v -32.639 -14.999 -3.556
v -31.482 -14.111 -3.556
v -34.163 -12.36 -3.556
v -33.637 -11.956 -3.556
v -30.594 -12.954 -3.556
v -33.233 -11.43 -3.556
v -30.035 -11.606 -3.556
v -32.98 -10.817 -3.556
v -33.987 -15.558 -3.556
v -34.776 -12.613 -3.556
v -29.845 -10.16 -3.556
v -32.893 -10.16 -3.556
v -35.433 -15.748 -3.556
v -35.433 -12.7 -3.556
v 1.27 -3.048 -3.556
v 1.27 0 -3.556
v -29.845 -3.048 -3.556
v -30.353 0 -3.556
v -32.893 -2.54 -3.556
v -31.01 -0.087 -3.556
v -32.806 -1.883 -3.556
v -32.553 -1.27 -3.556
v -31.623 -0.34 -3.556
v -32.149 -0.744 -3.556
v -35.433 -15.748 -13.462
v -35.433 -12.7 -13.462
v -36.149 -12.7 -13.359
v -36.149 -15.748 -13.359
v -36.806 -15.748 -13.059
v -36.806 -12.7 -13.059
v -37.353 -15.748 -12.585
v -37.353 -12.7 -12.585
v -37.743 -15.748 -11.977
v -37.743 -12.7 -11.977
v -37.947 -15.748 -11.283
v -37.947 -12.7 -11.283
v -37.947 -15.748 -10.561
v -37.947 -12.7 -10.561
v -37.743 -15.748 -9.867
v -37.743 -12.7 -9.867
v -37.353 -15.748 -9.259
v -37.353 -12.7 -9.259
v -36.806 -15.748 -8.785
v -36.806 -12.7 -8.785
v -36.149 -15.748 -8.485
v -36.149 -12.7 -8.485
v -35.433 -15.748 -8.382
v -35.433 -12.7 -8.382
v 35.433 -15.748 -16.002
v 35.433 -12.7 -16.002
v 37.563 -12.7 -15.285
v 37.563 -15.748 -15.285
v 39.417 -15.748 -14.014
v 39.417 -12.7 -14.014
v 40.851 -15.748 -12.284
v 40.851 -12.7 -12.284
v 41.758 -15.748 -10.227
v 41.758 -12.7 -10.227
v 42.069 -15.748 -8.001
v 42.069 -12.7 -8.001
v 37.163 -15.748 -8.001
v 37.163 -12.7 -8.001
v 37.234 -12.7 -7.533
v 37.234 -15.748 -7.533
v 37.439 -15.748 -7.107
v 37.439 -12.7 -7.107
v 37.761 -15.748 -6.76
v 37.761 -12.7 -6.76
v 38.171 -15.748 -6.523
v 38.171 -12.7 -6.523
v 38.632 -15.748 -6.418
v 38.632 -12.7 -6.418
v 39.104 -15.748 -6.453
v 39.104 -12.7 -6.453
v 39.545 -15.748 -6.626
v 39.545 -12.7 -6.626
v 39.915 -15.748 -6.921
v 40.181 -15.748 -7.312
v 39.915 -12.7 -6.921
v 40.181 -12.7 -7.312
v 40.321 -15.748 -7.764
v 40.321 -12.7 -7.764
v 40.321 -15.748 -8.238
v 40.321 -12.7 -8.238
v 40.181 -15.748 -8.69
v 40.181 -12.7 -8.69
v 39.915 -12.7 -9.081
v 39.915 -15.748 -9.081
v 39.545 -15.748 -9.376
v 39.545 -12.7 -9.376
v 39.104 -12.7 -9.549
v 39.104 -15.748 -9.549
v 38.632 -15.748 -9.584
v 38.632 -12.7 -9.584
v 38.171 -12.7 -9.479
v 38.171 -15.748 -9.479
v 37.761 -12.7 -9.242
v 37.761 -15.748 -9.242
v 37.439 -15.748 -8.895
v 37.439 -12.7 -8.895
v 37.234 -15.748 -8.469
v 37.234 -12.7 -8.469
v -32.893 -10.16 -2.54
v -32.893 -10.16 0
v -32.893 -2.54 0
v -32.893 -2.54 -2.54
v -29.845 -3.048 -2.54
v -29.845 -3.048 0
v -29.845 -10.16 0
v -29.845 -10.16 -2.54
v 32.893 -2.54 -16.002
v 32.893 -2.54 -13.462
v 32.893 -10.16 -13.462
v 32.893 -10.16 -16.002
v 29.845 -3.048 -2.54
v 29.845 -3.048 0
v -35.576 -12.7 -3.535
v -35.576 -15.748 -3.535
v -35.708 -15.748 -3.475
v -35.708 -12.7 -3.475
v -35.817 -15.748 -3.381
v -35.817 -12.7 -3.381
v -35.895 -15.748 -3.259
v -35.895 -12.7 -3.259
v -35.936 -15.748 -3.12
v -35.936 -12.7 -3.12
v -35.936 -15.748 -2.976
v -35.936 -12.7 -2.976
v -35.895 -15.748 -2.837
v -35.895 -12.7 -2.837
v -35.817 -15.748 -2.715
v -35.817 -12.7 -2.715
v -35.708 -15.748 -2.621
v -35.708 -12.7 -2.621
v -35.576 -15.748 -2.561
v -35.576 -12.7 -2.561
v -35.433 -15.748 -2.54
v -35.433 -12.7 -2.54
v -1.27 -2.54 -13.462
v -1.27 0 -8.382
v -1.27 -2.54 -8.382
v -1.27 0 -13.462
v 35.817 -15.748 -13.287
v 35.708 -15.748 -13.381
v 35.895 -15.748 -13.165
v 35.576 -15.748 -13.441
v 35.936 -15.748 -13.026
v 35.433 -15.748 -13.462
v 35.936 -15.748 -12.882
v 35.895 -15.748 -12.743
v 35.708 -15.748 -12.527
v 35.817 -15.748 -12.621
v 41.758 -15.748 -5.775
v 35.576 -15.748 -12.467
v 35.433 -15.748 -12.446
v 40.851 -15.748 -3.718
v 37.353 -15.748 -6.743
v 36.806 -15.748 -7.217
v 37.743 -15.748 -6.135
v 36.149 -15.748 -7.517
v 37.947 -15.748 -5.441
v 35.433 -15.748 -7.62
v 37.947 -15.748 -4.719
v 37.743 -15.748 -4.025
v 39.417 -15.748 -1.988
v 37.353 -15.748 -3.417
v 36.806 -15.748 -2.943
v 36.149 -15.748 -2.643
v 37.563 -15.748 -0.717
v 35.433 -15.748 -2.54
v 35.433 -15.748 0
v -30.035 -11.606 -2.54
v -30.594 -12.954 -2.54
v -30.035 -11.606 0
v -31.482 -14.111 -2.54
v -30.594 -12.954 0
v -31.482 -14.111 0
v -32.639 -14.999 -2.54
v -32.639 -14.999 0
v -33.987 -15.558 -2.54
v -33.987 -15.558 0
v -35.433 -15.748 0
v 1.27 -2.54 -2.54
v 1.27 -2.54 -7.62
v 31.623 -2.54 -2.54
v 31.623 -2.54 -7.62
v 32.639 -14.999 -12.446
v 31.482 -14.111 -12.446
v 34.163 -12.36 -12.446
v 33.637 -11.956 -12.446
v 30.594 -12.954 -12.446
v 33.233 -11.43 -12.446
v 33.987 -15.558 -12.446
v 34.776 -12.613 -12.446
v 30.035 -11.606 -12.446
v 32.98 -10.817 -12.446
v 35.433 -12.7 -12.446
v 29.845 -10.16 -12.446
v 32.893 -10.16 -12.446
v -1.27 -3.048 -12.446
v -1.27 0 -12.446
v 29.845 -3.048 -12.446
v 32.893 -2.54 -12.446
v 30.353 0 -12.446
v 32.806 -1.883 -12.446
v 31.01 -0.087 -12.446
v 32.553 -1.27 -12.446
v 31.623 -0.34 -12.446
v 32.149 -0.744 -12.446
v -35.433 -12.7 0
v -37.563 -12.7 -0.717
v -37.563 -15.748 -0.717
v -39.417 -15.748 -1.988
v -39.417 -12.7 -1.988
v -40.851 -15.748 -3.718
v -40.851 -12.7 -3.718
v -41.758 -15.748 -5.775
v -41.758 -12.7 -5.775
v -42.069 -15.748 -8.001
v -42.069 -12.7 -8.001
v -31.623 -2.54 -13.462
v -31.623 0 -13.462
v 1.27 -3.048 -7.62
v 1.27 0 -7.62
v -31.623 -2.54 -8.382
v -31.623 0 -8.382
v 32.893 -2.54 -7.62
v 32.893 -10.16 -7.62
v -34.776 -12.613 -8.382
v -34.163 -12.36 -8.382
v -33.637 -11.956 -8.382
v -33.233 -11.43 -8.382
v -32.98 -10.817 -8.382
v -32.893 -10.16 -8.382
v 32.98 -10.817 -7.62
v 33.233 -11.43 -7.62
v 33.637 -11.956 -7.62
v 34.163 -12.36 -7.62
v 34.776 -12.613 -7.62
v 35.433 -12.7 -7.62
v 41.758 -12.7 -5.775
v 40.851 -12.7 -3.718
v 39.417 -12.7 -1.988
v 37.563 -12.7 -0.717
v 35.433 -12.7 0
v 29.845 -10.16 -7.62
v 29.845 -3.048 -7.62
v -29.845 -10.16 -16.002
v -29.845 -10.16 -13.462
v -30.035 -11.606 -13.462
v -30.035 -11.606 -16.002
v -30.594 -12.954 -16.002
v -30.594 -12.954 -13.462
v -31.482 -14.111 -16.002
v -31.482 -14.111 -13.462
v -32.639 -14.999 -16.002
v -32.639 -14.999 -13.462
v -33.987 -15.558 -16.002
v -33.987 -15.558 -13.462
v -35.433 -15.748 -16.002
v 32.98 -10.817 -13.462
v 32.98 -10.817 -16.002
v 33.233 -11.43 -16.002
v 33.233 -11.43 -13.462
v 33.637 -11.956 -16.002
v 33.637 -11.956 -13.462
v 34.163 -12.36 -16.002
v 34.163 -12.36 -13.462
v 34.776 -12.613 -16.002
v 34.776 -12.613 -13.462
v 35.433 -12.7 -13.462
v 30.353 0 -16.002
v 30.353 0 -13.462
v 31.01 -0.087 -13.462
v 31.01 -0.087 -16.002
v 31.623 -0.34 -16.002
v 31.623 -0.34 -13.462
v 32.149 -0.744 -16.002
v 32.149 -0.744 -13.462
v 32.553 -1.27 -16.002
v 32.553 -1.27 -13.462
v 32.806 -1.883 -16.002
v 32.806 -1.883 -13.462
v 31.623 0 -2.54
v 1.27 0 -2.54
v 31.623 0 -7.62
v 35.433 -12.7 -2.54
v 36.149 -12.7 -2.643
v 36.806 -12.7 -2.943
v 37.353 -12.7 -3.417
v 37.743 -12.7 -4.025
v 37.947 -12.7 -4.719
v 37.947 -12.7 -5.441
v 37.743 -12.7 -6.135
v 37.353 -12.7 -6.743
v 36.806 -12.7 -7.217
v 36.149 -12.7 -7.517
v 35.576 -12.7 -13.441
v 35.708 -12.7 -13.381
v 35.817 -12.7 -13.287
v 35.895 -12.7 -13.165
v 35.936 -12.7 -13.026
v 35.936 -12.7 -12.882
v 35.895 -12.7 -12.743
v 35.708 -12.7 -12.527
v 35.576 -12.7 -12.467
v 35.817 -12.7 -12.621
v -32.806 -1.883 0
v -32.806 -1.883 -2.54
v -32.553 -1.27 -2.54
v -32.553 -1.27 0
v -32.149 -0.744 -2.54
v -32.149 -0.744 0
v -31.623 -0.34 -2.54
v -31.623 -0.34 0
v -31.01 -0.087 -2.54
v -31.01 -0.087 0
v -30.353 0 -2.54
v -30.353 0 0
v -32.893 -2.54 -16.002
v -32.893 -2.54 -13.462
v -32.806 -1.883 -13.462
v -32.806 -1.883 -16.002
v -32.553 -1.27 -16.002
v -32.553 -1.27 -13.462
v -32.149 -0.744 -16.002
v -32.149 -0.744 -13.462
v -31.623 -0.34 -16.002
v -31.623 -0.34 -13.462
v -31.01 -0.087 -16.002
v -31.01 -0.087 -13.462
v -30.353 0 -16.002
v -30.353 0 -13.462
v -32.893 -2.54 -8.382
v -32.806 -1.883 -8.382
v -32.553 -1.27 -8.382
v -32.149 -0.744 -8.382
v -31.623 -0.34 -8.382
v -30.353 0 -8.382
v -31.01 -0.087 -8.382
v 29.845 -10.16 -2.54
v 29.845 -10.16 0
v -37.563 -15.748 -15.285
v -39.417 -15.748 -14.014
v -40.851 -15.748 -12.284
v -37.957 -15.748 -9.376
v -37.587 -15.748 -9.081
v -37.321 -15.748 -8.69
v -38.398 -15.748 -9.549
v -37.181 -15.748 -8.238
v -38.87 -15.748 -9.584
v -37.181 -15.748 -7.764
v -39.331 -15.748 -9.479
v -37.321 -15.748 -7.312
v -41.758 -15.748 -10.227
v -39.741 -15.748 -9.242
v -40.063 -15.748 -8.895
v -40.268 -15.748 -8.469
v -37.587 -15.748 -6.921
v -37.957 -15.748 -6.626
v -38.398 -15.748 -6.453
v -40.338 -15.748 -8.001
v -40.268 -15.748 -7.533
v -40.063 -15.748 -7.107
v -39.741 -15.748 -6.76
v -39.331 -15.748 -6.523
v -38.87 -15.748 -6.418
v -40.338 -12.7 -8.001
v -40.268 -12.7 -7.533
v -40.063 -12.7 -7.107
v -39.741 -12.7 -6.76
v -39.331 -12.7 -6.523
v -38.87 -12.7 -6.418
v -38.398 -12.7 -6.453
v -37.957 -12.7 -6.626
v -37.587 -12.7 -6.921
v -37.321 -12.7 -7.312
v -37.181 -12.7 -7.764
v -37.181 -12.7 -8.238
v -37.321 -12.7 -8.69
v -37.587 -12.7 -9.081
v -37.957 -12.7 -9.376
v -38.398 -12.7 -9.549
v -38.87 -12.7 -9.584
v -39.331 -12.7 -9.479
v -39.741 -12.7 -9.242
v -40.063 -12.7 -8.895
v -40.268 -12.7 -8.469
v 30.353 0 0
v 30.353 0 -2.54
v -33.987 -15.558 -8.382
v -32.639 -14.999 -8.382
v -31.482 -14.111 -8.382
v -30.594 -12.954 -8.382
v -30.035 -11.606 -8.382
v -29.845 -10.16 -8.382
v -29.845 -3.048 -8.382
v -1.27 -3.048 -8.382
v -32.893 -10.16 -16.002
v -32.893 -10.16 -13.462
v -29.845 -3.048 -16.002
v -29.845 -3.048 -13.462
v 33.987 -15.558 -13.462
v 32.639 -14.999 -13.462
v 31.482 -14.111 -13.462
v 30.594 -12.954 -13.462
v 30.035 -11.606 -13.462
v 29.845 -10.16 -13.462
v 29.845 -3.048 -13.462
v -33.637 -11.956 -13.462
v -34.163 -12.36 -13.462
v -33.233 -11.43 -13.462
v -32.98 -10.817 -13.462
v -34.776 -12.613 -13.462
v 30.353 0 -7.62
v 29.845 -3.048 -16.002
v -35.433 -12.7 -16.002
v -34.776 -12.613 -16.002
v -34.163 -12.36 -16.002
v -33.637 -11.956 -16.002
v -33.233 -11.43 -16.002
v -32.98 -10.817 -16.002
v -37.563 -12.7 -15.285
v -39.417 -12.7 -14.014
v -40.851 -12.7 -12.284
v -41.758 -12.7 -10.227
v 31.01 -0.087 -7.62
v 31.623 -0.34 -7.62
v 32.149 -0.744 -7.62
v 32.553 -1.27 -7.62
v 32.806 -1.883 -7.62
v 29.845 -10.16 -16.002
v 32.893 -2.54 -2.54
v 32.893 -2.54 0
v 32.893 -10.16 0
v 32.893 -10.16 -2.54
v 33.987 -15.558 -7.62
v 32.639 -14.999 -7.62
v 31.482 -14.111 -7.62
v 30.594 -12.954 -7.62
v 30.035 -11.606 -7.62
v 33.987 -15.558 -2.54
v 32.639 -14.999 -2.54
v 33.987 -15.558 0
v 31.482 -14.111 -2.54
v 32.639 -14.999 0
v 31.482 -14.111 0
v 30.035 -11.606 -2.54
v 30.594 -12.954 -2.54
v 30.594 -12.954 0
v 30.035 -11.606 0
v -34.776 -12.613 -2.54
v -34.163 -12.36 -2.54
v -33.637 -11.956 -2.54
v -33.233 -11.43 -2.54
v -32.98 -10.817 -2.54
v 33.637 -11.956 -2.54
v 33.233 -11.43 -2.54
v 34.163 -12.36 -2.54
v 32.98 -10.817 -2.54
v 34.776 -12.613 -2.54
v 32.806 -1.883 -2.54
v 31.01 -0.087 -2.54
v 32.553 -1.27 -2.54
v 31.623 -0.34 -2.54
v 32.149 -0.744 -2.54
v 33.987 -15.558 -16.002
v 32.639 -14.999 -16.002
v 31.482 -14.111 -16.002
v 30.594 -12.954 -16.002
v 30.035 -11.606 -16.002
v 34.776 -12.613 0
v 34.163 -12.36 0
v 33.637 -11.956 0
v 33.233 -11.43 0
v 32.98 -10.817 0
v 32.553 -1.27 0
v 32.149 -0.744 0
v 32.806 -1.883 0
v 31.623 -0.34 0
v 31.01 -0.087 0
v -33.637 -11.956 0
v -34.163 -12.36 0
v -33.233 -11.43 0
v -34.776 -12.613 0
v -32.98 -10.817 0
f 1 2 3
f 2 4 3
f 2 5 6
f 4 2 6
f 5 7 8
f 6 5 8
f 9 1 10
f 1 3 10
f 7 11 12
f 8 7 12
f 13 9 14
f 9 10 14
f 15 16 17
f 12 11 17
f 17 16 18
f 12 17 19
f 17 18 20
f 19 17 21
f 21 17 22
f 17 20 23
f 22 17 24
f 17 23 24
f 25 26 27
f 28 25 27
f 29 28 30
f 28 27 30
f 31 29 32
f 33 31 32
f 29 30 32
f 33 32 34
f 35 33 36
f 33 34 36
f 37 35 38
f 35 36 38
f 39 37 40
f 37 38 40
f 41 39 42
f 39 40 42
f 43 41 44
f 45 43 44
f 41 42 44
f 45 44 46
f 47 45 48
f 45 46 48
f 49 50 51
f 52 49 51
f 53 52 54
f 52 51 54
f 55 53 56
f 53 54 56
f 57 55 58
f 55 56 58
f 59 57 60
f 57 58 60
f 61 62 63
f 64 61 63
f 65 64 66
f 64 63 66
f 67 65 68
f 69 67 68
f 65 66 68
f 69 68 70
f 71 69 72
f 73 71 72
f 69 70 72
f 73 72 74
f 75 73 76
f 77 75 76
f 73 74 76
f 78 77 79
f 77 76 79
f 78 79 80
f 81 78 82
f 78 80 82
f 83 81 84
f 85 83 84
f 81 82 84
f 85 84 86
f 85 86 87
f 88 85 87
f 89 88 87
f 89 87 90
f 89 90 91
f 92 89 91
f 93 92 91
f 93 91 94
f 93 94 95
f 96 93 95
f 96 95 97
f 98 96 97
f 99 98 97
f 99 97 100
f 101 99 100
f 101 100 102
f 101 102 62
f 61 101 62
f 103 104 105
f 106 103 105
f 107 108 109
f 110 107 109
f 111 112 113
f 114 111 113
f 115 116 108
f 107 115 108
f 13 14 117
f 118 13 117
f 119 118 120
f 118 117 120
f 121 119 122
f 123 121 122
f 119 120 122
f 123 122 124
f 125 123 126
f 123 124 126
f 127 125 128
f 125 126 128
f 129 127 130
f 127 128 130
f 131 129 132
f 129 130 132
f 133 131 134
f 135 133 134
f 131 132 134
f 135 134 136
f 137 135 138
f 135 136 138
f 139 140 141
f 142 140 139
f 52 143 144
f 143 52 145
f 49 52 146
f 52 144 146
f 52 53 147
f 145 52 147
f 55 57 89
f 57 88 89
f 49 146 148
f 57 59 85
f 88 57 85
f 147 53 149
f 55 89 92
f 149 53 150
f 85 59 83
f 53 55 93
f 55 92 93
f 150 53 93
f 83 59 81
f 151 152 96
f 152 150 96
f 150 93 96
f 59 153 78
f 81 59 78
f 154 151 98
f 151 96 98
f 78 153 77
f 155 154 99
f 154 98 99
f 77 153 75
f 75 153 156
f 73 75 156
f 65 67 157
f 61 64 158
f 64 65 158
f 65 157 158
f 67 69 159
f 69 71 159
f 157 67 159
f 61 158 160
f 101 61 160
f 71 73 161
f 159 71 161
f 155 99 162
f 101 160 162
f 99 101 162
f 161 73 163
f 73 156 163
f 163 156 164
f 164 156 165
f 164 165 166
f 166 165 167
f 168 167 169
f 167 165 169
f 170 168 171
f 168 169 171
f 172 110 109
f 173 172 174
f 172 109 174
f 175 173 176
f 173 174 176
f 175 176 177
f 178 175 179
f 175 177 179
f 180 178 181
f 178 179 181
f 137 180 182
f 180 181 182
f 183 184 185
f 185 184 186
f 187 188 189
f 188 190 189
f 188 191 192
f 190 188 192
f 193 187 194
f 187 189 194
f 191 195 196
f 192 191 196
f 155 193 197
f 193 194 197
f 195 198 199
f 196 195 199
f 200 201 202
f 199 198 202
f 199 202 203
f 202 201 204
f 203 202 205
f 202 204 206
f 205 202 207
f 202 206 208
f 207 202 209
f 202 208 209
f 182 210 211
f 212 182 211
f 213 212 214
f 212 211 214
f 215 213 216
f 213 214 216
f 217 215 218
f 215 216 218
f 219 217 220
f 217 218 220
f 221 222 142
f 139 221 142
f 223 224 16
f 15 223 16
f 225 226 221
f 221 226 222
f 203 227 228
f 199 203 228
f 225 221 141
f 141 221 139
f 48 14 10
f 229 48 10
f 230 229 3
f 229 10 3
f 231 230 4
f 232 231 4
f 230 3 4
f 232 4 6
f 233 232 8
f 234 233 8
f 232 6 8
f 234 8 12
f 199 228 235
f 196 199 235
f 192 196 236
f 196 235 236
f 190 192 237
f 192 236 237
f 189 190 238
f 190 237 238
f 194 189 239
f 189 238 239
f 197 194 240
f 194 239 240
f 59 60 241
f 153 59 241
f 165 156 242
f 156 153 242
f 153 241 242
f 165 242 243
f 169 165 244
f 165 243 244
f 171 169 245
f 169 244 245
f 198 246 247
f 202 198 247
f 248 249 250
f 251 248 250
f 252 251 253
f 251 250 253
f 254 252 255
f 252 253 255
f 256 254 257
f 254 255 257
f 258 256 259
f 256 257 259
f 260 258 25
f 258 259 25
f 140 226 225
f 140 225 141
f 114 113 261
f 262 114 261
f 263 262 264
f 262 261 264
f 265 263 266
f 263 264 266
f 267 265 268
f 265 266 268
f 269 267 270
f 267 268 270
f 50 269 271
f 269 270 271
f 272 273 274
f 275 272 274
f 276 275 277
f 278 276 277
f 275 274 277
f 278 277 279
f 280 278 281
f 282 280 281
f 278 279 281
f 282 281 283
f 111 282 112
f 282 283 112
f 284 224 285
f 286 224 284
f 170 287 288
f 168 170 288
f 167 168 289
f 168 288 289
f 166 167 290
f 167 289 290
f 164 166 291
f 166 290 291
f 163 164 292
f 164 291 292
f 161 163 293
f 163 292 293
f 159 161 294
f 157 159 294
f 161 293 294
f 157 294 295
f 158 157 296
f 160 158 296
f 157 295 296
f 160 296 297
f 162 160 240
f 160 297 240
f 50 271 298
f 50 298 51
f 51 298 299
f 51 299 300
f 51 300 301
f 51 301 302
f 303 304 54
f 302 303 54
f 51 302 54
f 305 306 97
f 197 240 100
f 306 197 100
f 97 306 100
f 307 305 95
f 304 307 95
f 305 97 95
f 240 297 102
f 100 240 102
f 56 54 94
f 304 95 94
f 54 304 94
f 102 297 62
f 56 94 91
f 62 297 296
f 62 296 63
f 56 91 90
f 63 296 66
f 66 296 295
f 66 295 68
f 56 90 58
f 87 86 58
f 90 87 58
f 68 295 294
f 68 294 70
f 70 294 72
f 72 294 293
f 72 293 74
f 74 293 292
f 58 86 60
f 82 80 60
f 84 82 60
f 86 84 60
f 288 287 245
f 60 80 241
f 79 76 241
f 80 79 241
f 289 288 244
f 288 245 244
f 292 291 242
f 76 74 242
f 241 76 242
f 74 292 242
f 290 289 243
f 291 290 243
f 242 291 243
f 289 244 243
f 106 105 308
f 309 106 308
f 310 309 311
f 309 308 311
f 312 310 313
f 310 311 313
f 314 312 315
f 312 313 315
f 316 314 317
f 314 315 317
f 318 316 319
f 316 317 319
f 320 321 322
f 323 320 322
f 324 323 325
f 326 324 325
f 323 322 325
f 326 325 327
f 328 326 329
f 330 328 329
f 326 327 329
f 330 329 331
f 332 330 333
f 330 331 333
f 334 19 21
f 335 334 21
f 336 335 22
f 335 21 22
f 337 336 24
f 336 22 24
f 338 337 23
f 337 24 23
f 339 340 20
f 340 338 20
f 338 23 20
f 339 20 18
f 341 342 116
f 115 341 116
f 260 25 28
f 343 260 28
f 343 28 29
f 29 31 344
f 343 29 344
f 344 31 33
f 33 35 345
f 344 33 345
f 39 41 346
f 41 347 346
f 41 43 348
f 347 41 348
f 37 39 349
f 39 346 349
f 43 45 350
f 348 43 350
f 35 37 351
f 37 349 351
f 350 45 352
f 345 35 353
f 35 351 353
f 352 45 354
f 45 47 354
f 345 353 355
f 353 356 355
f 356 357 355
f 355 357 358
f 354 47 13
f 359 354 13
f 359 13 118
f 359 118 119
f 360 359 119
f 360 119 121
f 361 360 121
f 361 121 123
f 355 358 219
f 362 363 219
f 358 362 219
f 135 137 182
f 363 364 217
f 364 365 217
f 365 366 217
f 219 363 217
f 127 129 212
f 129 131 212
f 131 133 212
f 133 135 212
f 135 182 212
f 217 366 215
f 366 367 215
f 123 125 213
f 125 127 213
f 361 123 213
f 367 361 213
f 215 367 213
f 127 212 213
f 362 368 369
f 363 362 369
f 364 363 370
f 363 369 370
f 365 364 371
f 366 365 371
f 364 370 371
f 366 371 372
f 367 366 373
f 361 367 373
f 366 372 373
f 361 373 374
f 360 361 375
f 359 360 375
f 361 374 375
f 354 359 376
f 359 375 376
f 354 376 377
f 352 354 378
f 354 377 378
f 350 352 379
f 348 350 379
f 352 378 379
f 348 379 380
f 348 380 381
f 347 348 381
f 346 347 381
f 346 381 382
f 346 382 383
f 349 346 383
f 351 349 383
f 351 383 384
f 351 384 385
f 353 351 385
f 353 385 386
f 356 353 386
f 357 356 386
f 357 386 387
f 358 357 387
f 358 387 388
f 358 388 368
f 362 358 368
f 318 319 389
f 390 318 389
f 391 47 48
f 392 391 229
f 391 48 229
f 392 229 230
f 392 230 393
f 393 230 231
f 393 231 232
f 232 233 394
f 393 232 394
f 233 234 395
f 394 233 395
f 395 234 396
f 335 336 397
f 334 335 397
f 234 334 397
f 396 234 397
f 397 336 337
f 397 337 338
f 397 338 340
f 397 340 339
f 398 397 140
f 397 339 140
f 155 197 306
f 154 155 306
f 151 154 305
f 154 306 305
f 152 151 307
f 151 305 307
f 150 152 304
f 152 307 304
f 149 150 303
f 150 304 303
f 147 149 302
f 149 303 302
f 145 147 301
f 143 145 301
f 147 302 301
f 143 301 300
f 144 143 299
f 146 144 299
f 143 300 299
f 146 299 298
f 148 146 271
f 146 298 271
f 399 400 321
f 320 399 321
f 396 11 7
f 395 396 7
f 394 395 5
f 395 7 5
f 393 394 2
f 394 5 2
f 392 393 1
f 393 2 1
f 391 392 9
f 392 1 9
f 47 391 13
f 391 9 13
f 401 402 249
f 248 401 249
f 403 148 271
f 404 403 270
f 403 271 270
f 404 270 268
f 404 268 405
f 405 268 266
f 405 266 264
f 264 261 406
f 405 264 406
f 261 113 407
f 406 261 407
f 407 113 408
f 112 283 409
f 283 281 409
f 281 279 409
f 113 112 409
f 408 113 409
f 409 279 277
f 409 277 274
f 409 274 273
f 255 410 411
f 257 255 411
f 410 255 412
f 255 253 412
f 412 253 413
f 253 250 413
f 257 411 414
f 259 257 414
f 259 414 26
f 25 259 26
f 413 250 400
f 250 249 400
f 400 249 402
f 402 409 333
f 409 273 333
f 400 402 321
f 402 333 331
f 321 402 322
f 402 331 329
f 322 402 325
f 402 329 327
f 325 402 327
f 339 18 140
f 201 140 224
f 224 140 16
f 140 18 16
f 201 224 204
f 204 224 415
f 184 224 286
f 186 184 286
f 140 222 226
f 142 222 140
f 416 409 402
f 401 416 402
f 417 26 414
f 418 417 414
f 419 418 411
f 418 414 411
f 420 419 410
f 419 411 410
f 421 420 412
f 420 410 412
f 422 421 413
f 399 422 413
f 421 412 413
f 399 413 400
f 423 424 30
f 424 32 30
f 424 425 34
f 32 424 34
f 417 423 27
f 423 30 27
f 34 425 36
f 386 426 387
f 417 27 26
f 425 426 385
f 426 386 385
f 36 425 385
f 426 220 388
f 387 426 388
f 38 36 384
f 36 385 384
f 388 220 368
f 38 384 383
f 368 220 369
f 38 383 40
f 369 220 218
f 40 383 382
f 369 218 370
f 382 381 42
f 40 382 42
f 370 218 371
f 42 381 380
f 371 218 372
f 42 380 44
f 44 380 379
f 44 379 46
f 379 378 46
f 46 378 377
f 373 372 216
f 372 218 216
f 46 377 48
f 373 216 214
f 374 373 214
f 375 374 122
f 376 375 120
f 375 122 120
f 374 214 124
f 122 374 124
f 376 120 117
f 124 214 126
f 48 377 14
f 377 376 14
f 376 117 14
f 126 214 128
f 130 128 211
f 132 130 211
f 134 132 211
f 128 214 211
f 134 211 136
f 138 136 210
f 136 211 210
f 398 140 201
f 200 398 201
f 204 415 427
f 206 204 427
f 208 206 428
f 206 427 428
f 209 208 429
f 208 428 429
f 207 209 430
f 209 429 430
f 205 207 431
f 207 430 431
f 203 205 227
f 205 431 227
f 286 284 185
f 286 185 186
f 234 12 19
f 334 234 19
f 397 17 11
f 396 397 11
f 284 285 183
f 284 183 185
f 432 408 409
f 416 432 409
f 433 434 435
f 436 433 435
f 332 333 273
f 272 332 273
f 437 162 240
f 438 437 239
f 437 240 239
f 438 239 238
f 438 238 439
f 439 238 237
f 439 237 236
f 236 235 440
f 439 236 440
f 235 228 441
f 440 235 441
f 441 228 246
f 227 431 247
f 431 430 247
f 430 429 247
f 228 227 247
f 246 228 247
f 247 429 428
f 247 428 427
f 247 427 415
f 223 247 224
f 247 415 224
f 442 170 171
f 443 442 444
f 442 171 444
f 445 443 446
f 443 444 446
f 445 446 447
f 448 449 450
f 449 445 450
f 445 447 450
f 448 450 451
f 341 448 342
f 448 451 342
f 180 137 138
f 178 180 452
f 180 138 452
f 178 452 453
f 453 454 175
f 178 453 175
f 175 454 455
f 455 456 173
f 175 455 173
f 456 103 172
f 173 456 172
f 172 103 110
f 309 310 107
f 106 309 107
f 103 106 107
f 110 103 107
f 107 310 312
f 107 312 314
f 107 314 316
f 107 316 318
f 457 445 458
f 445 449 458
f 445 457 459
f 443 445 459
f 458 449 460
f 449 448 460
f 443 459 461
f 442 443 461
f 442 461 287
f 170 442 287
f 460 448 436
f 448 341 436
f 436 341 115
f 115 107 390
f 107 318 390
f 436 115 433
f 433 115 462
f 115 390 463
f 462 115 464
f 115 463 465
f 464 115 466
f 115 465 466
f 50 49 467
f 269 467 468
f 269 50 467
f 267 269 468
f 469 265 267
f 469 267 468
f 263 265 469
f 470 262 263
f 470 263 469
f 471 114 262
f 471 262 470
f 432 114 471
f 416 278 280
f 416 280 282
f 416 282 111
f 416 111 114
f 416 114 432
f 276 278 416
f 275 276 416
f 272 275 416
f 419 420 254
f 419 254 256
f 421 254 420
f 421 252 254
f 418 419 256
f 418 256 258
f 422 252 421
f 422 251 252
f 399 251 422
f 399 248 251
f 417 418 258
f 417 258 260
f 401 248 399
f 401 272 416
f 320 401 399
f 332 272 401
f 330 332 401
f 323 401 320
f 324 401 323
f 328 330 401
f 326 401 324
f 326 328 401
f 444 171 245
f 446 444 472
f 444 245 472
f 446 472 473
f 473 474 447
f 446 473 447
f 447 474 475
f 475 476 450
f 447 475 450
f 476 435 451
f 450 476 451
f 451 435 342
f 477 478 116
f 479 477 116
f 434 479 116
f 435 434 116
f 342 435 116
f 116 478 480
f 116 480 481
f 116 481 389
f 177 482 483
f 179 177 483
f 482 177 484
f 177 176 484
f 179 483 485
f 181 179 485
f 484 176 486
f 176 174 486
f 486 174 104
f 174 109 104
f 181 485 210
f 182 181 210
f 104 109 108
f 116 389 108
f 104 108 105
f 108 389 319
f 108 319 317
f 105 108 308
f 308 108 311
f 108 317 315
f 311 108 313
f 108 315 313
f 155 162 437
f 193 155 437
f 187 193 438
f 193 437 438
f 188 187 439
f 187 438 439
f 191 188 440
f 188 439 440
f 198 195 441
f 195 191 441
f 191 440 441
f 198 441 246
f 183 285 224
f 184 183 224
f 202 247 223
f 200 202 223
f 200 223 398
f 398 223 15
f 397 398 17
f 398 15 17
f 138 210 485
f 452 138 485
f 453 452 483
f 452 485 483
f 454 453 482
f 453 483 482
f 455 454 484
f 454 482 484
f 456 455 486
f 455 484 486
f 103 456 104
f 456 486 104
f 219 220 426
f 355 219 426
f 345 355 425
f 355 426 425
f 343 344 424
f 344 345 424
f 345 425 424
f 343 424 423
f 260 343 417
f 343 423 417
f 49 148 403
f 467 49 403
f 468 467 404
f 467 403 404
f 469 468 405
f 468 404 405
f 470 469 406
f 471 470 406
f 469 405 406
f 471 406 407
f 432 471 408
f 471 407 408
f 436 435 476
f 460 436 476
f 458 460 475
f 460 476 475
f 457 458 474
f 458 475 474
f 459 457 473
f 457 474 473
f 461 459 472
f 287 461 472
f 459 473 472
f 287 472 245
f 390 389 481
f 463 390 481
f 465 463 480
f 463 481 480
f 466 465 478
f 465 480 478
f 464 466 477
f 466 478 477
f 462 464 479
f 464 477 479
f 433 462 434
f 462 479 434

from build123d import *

# Parameters (mm, degrees)
EXTRUDE_THIN1_DEPTH   = 16.002
SKETCH2_R             = 1.5875
CUT_EXTRUDE1_DEPTH    = 48.684832332
SKETCH3_W             = 30.353
SKETCH3_H             = 5.08
BOSS_EXTRUDE1_DEPTH   = 2.54
BOSS_EXTRUDE1_2_DEPTH = 2.54


with BuildPart() as part:
    # Sketch1 → Extrude-Thin1 (new body)
    with BuildSketch(Plane.XY):
        with BuildLine():
            Line((-42.06875, -12.7), (-35.433, -12.7))
            ThreePointArc((-35.433, -12.7), (-33.636948776, -11.956051224), (-32.893, -10.16))
            Line((-32.893, -10.16), (-32.893, -2.54))
            ThreePointArc((-32.893, -2.54), (-32.149051224, -0.743948776), (-30.353, 0))
            Line((-30.353, 0), (30.353, 0))
            ThreePointArc((30.353, 0), (32.149051224, -0.743948776), (32.893, -2.54))
            Line((32.893, -2.54), (32.893, -10.16))
            ThreePointArc((32.893, -10.16), (33.636948776, -11.956051224), (35.433, -12.7))
            Line((35.433, -12.7), (42.06875, -12.7))
            Line((42.06875, -12.7), (42.06875, -15.748))
            Line((42.06875, -15.748), (35.433, -15.748))
            ThreePointArc((35.433, -15.748), (31.481687307, -14.111312693), (29.845, -10.16))
            Line((29.845, -10.16), (29.845, -3.048))
            Line((29.845, -3.048), (-29.845, -3.048))
            Line((-29.845, -3.048), (-29.845, -10.16))
            ThreePointArc((-29.845, -10.16), (-31.481687307, -14.111312693), (-35.433, -15.748))
            Line((-35.433, -15.748), (-42.06875, -15.748))
            Line((-42.06875, -15.748), (-42.06875, -12.7))
        make_face()
    extrude(amount=-EXTRUDE_THIN1_DEPTH)

    # Sketch2 → Cut-Extrude1 (cut, through all)
    with BuildSketch(Plane(origin=(0, 0, 0), x_dir=(1, 0, 0), z_dir=(0, 1, 0))):
        with BuildLine():
            ThreePointArc((-42.06875, 8.001), (-40.193949205, 13.198335352), (-35.433, 16.002))
            Line((-35.433, 16.002), (-42.06875, 16.002))
            Line((-42.06875, 16.002), (-42.06875, 8.001))
        make_face()
        with BuildLine():
            ThreePointArc((-35.433, 0), (-40.193949205, 2.803664648), (-42.06875, 8.001))
            Line((-42.06875, 8.001), (-42.06875, 0))
            Line((-42.06875, 0), (-35.433, 0))
        make_face()
        with BuildLine():
            Line((-30.353, 13.462), (-35.433, 13.462))
            ThreePointArc((-35.433, 13.462), (-37.973, 10.922), (-35.433, 8.382))
            Line((-35.433, 8.382), (-30.353, 8.382))
            Line((-30.353, 8.382), (-30.353, 13.462))
        make_face()
        Polygon((-1.27, 13.462), (-30.353, 13.462), (-30.353, 8.382), (-1.27, 8.382), (-1.27, 12.446), (30.353, 12.446), (30.353, 13.462), (0, 13.462), align=None)
        Polygon((1.27, 3.556), (-30.353, 3.556), (-30.353, 2.54), (0, 2.54), (1.27, 2.54), (30.353, 2.54), (30.353, 7.62), (1.27, 7.62), align=None)
        with BuildLine():
            Line((35.433, 7.62), (30.353, 7.62))
            Line((30.353, 7.62), (30.353, 2.54))
            Line((30.353, 2.54), (35.433, 2.54))
            ThreePointArc((35.433, 2.54), (37.973, 5.08), (35.433, 7.62))
        make_face()
        with Locations(Location((38.750875, 8.001, 0), (0, 0, 180))):
            Circle(SKETCH2_R)
        with BuildLine():
            ThreePointArc((42.06875, 8.001), (40.193949205, 2.803664648), (35.433, 0))
            Line((35.433, 0), (42.06875, 0))
            Line((42.06875, 0), (42.06875, 8.001))
        make_face()
        with BuildLine():
            ThreePointArc((35.433, 16.002), (40.193949205, 13.198335352), (42.06875, 8.001))
            Line((42.06875, 8.001), (42.06875, 16.002))
            Line((42.06875, 16.002), (35.433, 16.002))
        make_face()
        with BuildLine():
            Line((35.433, 13.462), (30.353, 13.462))
            Line((30.353, 13.462), (30.353, 12.446))
            Line((30.353, 12.446), (35.433, 12.446))
            ThreePointArc((35.433, 12.446), (35.941, 12.954), (35.433, 13.462))
        make_face()
        with BuildLine():
            Line((-30.353, 2.54), (-30.353, 3.556))
            Line((-30.353, 3.556), (-35.433, 3.556))
            ThreePointArc((-35.433, 3.556), (-35.941, 3.048), (-35.433, 2.54))
            Line((-35.433, 2.54), (-30.353, 2.54))
        make_face()
        with Locations(Location((-38.750875, 8.001, 0), (0, 0, 180))):
            Circle(SKETCH2_R)
    extrude(amount=-CUT_EXTRUDE1_DEPTH, mode=Mode.SUBTRACT)


with BuildPart() as body_2:
    # Sketch3 → Boss-Extrude1 (new body)
    with BuildSketch(Plane(origin=(0, 0, 0), x_dir=(1, 0, 0), z_dir=(0, 1, 0))):
        with Locations((-16.4465, 10.922)):
            Rectangle(SKETCH3_W, SKETCH3_H)
    extrude(amount=-BOSS_EXTRUDE1_DEPTH)


with BuildPart() as body_3:
    # Sketch3 → Boss-Extrude1 2 (new body)
    with BuildSketch(Plane(origin=(0, 0, 0), x_dir=(1, 0, 0), z_dir=(0, 1, 0))):
        with Locations((16.4465, 5.08)):
            Rectangle(SKETCH3_W, SKETCH3_H)
    extrude(amount=-BOSS_EXTRUDE1_2_DEPTH)


solid = Compound([part.part, body_2.part, body_3.part])
